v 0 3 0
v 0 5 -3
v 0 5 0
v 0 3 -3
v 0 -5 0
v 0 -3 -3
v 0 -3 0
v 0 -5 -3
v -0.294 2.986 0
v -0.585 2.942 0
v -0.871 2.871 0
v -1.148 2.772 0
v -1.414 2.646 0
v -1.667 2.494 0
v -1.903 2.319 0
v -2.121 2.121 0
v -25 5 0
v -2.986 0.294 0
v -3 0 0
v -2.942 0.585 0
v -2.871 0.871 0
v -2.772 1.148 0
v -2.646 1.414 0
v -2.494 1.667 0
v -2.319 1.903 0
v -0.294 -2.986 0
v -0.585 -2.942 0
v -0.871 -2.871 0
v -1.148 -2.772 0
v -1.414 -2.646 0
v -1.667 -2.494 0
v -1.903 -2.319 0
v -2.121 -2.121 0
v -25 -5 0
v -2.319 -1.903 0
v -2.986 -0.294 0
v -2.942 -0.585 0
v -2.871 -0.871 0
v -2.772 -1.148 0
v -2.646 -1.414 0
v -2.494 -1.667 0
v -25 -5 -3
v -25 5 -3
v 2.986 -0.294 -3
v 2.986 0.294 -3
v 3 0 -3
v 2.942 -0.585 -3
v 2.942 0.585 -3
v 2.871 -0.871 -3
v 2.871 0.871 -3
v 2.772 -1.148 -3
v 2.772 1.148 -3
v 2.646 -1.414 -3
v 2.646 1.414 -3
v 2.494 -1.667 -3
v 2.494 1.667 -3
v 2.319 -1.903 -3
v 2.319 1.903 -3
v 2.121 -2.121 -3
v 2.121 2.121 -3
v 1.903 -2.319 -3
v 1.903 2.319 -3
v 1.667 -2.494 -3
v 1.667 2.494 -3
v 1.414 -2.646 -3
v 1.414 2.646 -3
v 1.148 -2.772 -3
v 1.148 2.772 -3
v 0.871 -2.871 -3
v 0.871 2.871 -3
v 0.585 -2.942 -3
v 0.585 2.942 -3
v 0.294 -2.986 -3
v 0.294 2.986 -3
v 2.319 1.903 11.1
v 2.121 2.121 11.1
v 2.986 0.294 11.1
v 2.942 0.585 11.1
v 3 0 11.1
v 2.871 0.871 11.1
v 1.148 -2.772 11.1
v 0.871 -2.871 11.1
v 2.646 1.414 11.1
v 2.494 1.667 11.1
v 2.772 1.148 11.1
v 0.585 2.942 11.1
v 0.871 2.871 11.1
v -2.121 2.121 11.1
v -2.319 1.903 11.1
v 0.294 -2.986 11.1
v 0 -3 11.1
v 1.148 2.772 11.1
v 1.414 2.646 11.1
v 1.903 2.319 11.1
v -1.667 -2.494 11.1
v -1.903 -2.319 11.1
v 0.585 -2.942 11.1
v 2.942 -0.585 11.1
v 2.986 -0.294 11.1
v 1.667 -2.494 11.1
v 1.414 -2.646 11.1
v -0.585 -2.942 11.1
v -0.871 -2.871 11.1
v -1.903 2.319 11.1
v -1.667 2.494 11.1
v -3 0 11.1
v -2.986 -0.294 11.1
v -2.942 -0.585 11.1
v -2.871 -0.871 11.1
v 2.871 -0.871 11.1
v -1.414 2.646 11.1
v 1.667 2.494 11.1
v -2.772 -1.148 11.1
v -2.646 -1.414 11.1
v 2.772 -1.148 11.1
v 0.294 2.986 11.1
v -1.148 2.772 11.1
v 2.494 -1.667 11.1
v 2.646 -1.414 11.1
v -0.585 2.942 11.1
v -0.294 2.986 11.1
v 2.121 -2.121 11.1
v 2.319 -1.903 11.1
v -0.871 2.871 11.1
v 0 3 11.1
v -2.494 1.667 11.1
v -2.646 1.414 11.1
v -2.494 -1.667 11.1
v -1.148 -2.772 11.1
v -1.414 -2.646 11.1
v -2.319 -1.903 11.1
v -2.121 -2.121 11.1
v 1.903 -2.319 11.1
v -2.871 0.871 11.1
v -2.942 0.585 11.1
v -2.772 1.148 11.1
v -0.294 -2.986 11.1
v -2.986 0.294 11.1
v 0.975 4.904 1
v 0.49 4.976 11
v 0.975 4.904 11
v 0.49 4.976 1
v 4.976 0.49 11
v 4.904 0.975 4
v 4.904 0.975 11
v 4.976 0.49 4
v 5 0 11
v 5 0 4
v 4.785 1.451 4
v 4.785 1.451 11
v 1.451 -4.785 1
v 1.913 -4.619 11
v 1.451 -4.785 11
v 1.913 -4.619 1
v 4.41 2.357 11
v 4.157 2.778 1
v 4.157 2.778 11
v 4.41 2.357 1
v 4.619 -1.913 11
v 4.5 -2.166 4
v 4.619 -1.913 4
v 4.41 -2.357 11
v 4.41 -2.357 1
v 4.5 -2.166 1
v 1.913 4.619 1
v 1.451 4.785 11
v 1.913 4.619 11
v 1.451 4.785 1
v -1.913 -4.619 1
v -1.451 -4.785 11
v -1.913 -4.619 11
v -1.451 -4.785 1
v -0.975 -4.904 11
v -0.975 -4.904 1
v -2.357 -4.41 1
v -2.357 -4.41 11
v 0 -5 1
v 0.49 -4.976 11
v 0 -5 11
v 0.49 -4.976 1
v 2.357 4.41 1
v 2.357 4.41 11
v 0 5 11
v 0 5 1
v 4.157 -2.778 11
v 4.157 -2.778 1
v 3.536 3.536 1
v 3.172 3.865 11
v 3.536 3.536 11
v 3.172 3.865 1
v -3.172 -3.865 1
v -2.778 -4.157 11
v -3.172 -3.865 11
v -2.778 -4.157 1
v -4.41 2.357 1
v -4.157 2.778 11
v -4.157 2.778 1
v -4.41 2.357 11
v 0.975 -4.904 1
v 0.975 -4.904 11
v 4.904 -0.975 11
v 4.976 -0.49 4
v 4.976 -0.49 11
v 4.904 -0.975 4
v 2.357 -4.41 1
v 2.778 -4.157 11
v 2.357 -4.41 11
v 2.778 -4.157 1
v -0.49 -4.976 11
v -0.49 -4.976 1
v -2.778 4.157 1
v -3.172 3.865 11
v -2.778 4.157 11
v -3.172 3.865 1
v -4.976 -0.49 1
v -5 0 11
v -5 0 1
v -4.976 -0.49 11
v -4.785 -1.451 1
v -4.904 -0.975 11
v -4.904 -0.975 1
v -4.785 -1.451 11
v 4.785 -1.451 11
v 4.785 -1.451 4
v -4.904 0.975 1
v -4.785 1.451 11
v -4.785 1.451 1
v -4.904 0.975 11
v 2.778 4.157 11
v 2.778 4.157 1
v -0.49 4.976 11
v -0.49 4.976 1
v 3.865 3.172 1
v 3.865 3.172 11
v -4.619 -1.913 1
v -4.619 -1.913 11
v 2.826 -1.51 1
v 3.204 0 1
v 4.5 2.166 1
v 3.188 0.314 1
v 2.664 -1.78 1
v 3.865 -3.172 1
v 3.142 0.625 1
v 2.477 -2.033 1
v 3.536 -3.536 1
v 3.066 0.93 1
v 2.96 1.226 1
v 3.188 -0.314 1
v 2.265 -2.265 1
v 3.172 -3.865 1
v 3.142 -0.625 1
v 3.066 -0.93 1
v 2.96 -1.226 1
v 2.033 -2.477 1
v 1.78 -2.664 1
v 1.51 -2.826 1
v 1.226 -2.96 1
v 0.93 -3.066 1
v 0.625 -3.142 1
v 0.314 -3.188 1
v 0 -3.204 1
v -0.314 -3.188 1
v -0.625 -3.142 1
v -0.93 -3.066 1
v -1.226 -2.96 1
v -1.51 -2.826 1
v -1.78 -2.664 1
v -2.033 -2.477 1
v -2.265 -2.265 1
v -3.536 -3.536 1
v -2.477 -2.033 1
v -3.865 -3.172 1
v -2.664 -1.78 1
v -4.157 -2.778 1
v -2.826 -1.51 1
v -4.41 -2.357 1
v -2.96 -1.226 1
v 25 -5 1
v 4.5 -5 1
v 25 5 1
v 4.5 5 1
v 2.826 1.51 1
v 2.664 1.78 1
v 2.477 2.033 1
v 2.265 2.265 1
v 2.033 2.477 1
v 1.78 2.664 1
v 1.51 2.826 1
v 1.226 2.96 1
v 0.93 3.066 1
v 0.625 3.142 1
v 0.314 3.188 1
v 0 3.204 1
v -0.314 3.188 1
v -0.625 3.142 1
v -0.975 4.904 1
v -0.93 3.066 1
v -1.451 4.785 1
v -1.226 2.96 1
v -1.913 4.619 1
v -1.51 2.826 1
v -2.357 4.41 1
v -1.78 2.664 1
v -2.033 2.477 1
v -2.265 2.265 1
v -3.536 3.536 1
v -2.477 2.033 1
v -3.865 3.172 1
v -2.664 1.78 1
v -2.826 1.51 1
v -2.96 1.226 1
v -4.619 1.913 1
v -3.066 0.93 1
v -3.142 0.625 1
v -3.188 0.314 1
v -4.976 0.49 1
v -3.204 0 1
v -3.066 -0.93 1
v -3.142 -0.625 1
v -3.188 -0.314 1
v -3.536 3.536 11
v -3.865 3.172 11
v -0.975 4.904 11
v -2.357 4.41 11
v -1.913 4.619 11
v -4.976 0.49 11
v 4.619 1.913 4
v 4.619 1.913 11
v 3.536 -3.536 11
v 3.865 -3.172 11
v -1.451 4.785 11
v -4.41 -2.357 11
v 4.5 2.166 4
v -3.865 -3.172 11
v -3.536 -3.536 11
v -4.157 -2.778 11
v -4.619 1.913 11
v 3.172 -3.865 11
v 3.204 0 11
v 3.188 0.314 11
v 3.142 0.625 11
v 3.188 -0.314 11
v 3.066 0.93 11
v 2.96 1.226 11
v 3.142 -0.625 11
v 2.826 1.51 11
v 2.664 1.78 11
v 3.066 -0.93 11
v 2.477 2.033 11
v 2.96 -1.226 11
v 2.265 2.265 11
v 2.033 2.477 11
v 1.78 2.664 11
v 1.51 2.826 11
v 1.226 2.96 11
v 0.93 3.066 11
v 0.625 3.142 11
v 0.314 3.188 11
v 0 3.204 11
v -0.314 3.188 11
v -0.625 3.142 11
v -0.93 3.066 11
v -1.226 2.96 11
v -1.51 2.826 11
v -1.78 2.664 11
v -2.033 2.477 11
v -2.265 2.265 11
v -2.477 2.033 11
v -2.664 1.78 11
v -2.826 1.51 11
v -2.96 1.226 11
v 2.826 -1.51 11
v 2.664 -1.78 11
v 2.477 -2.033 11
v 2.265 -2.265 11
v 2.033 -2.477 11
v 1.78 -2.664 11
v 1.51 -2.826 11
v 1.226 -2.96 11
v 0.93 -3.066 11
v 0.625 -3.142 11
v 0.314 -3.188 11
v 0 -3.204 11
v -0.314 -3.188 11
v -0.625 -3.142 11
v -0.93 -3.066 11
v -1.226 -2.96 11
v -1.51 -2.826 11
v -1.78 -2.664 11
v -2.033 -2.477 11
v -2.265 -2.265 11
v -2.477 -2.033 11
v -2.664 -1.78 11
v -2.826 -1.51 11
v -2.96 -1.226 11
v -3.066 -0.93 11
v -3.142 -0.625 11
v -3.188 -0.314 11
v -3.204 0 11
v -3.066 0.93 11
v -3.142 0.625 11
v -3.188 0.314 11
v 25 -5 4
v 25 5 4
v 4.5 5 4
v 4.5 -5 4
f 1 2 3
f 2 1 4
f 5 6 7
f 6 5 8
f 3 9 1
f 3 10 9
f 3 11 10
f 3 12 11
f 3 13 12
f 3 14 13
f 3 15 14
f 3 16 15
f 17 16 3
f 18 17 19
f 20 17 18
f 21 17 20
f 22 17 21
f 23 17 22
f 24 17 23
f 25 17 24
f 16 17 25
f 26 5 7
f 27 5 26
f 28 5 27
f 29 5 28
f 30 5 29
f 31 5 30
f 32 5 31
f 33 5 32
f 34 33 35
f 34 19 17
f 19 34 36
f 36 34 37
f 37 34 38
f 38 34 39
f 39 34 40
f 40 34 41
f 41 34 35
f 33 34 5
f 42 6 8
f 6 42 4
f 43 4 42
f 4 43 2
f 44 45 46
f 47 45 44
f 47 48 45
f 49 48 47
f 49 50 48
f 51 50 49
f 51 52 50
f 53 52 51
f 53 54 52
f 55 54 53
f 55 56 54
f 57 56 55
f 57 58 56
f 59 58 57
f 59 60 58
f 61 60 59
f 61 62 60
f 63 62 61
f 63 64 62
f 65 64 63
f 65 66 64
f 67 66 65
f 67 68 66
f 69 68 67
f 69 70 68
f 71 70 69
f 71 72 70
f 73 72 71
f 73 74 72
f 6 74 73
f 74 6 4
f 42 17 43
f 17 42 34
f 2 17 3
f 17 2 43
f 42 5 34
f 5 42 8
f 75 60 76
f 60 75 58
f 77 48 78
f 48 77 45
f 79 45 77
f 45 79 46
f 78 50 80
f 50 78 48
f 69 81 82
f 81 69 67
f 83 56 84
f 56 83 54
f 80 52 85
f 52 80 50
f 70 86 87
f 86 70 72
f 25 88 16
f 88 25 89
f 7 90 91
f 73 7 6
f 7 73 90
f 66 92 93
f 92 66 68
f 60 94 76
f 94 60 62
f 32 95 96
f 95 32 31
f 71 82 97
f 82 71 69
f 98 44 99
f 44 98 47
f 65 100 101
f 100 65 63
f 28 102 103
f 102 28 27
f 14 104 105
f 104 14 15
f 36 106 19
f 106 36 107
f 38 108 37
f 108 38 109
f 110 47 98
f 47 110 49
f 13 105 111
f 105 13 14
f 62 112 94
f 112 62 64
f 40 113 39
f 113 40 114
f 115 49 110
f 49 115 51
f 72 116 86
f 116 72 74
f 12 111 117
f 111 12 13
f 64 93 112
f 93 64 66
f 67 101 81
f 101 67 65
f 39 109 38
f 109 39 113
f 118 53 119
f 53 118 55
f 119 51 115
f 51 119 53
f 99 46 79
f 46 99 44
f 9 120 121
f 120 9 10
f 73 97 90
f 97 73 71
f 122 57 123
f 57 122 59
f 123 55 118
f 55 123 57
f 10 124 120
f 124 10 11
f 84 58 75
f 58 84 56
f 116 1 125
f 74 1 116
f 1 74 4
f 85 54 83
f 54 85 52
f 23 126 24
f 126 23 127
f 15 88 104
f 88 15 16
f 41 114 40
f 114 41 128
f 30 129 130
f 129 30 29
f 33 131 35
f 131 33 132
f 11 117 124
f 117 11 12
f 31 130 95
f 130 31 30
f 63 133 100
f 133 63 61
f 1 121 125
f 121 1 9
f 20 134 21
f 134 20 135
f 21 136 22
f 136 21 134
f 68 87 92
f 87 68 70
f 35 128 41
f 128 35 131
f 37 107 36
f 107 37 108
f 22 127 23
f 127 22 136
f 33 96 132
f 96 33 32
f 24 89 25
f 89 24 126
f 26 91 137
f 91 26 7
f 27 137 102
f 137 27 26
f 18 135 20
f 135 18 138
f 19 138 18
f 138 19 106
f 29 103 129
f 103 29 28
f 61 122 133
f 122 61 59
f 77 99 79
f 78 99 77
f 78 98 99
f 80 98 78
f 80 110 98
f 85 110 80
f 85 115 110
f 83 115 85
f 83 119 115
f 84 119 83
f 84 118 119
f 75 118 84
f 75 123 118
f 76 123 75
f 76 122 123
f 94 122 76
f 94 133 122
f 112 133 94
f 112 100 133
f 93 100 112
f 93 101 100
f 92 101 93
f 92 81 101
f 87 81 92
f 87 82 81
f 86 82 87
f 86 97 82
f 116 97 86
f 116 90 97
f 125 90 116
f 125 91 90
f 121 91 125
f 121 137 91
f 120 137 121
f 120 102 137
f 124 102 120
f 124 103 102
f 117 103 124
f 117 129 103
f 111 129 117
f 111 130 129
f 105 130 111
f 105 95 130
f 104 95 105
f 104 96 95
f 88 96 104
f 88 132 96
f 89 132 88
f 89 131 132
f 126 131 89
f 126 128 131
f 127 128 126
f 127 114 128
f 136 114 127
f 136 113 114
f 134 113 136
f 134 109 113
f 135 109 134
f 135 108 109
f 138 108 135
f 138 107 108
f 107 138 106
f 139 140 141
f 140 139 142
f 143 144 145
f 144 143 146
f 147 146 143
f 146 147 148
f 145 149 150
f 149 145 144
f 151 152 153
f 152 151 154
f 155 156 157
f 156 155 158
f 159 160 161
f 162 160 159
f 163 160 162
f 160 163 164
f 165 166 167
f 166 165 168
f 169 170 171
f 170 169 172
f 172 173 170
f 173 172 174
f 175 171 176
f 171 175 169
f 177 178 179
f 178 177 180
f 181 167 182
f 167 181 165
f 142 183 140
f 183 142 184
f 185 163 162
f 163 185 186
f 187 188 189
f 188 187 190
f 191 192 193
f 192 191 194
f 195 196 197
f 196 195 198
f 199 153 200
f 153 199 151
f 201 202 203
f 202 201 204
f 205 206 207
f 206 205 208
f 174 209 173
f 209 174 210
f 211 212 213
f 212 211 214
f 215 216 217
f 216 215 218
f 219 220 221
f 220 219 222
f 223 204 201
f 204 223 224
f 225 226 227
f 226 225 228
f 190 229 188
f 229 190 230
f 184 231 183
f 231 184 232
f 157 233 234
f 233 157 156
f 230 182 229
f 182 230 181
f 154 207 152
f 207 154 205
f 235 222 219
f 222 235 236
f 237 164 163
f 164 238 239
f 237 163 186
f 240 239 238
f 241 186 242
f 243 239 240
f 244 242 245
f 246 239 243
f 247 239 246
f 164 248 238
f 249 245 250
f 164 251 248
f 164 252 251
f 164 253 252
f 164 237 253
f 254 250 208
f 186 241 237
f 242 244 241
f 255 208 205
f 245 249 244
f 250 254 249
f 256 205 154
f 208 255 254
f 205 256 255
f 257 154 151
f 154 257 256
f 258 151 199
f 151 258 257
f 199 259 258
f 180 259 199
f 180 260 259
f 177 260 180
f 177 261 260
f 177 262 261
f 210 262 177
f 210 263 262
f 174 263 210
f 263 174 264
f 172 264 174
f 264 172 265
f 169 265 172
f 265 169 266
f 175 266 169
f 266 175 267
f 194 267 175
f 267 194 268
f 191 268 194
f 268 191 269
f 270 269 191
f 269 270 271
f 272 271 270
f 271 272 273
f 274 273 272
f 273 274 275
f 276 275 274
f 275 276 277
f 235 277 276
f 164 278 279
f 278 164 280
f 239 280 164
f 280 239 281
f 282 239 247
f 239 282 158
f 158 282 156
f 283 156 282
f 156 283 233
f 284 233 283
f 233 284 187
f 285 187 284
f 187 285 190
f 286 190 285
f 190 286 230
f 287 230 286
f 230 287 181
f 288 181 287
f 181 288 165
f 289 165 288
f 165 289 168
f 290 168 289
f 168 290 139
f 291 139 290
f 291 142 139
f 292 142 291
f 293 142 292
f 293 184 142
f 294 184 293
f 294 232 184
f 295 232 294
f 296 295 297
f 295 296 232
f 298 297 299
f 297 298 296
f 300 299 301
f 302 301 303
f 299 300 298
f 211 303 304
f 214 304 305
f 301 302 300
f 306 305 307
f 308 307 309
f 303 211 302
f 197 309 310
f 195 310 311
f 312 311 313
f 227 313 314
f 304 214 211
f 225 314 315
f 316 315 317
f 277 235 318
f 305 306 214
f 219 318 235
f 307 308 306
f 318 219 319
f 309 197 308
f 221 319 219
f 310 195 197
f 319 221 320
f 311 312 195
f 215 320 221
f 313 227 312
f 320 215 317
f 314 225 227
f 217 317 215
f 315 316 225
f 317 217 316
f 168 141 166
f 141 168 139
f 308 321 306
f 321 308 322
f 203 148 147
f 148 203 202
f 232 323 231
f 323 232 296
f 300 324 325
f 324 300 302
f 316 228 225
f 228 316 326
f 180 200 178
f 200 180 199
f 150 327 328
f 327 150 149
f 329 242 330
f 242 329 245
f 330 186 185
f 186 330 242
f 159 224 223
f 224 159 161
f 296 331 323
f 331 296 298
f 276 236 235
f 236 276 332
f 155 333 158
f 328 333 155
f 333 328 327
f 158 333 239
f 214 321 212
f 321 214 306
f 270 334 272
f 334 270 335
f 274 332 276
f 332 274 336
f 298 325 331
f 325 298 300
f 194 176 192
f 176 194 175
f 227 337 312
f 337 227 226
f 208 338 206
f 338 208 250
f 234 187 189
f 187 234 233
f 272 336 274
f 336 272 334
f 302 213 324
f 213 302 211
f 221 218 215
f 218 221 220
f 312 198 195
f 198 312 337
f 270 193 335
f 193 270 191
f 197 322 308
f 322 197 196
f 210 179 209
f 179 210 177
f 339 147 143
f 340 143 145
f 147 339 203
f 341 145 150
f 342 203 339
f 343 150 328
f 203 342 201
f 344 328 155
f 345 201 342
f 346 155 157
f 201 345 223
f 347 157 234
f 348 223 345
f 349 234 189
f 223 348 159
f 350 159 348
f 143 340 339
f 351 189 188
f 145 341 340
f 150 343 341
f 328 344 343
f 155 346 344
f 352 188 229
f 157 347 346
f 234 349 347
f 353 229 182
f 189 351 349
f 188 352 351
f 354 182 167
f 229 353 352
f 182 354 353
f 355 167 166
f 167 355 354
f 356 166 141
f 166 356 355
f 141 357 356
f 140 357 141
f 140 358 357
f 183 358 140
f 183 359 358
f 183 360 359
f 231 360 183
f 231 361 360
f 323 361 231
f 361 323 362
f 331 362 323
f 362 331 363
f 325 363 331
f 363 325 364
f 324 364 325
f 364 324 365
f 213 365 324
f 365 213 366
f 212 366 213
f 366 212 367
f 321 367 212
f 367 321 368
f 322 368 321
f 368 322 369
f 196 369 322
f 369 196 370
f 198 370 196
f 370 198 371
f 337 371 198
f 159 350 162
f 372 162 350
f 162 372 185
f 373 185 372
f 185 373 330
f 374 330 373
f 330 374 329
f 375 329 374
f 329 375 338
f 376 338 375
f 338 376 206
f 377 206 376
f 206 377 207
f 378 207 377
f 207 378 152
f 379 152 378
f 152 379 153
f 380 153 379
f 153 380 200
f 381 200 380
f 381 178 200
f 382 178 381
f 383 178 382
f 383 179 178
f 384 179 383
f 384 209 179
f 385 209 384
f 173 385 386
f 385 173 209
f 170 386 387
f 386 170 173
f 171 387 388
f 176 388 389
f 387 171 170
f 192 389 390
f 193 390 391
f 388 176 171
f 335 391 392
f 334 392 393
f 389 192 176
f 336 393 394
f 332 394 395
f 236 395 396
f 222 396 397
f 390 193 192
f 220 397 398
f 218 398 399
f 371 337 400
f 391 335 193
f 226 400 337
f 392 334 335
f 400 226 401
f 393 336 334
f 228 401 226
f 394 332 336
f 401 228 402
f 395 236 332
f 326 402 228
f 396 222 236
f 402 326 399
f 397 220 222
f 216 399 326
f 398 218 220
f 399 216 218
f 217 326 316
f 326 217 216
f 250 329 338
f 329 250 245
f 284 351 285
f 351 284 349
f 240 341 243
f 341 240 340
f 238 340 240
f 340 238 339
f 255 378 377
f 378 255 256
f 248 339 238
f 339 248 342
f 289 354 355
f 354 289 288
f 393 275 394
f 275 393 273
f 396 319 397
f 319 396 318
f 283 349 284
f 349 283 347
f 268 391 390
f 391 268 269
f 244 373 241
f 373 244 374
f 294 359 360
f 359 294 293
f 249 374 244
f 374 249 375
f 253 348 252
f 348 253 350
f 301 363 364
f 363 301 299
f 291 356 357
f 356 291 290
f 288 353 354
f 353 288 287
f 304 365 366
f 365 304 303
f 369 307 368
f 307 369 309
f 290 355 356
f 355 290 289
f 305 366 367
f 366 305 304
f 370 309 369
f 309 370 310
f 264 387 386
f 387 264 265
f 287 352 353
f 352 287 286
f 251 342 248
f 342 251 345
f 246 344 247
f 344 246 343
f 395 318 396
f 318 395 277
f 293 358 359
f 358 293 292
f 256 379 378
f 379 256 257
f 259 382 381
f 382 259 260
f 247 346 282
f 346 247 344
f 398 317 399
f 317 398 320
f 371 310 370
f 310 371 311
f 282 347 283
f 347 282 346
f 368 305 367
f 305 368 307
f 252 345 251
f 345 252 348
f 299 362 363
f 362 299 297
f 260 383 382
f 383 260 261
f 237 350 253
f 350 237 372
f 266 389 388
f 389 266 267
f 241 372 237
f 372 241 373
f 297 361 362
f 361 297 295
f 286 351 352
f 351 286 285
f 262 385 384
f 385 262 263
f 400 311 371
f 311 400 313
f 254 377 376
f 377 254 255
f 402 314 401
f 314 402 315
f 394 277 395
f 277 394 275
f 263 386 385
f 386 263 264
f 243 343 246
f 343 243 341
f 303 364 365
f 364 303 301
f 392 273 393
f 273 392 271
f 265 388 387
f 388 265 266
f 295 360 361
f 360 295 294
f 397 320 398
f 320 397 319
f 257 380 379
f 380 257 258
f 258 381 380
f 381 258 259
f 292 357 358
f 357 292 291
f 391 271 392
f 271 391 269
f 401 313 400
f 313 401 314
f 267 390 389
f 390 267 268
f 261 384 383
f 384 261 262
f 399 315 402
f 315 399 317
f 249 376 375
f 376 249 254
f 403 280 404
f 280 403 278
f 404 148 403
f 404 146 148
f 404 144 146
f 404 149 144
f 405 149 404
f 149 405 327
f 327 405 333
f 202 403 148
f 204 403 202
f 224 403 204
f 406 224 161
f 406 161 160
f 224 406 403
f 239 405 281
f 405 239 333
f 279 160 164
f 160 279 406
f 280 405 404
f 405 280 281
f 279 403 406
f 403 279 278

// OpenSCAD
// Reference submission for hinge-45-loose.
//
// Design decisions that the measurements depend on:
//   - the bore cylinder is scaled so its *inscribed* diameter is 6.40 mm, which
//     makes the as-designed diametral clearance 0.40 mm against a 6 mm pin;
//   - the fixed leaf sits below the knuckle (z -3..0) and the moving leaf above
//     it (z 1..4), so no sweep of the moving leaf can reach the fixed leaf;
//   - the pin runs the full knuckle length, so withdrawal along +Z clears it.
//
// Units: mm. Assembly axis: +Z through the origin.
agentscad_part = "all";
hinge_angle = 0;   // pose control: the benchmark re-renders the moving part at this angle
$fn = 64;

bore_d = 6.40 / cos(180 / $fn);

module fixed_leaf() {
  union() {
    translate([-25, -5, -3]) cube([25, 10, 3]);
    translate([0, 0, -3]) cylinder(h = 14.1, d = 6);
  }
}

module moving_leaf() {
  union() {
    difference() {
      translate([0, 0, 1]) cylinder(h = 10, d = 10);
      translate([0, 0, 0.9]) cylinder(h = 10.2, d = bore_d);
    }
    translate([4.5, -5, 1]) cube([20.5, 10, 3]);
  }
}

module generated_part() {
  if (agentscad_part == "all" || agentscad_part == "fixed") fixed_leaf();
  if (agentscad_part == "all" || agentscad_part == "moving") rotate([0, 0, hinge_angle]) moving_leaf();
}

generated_part();
